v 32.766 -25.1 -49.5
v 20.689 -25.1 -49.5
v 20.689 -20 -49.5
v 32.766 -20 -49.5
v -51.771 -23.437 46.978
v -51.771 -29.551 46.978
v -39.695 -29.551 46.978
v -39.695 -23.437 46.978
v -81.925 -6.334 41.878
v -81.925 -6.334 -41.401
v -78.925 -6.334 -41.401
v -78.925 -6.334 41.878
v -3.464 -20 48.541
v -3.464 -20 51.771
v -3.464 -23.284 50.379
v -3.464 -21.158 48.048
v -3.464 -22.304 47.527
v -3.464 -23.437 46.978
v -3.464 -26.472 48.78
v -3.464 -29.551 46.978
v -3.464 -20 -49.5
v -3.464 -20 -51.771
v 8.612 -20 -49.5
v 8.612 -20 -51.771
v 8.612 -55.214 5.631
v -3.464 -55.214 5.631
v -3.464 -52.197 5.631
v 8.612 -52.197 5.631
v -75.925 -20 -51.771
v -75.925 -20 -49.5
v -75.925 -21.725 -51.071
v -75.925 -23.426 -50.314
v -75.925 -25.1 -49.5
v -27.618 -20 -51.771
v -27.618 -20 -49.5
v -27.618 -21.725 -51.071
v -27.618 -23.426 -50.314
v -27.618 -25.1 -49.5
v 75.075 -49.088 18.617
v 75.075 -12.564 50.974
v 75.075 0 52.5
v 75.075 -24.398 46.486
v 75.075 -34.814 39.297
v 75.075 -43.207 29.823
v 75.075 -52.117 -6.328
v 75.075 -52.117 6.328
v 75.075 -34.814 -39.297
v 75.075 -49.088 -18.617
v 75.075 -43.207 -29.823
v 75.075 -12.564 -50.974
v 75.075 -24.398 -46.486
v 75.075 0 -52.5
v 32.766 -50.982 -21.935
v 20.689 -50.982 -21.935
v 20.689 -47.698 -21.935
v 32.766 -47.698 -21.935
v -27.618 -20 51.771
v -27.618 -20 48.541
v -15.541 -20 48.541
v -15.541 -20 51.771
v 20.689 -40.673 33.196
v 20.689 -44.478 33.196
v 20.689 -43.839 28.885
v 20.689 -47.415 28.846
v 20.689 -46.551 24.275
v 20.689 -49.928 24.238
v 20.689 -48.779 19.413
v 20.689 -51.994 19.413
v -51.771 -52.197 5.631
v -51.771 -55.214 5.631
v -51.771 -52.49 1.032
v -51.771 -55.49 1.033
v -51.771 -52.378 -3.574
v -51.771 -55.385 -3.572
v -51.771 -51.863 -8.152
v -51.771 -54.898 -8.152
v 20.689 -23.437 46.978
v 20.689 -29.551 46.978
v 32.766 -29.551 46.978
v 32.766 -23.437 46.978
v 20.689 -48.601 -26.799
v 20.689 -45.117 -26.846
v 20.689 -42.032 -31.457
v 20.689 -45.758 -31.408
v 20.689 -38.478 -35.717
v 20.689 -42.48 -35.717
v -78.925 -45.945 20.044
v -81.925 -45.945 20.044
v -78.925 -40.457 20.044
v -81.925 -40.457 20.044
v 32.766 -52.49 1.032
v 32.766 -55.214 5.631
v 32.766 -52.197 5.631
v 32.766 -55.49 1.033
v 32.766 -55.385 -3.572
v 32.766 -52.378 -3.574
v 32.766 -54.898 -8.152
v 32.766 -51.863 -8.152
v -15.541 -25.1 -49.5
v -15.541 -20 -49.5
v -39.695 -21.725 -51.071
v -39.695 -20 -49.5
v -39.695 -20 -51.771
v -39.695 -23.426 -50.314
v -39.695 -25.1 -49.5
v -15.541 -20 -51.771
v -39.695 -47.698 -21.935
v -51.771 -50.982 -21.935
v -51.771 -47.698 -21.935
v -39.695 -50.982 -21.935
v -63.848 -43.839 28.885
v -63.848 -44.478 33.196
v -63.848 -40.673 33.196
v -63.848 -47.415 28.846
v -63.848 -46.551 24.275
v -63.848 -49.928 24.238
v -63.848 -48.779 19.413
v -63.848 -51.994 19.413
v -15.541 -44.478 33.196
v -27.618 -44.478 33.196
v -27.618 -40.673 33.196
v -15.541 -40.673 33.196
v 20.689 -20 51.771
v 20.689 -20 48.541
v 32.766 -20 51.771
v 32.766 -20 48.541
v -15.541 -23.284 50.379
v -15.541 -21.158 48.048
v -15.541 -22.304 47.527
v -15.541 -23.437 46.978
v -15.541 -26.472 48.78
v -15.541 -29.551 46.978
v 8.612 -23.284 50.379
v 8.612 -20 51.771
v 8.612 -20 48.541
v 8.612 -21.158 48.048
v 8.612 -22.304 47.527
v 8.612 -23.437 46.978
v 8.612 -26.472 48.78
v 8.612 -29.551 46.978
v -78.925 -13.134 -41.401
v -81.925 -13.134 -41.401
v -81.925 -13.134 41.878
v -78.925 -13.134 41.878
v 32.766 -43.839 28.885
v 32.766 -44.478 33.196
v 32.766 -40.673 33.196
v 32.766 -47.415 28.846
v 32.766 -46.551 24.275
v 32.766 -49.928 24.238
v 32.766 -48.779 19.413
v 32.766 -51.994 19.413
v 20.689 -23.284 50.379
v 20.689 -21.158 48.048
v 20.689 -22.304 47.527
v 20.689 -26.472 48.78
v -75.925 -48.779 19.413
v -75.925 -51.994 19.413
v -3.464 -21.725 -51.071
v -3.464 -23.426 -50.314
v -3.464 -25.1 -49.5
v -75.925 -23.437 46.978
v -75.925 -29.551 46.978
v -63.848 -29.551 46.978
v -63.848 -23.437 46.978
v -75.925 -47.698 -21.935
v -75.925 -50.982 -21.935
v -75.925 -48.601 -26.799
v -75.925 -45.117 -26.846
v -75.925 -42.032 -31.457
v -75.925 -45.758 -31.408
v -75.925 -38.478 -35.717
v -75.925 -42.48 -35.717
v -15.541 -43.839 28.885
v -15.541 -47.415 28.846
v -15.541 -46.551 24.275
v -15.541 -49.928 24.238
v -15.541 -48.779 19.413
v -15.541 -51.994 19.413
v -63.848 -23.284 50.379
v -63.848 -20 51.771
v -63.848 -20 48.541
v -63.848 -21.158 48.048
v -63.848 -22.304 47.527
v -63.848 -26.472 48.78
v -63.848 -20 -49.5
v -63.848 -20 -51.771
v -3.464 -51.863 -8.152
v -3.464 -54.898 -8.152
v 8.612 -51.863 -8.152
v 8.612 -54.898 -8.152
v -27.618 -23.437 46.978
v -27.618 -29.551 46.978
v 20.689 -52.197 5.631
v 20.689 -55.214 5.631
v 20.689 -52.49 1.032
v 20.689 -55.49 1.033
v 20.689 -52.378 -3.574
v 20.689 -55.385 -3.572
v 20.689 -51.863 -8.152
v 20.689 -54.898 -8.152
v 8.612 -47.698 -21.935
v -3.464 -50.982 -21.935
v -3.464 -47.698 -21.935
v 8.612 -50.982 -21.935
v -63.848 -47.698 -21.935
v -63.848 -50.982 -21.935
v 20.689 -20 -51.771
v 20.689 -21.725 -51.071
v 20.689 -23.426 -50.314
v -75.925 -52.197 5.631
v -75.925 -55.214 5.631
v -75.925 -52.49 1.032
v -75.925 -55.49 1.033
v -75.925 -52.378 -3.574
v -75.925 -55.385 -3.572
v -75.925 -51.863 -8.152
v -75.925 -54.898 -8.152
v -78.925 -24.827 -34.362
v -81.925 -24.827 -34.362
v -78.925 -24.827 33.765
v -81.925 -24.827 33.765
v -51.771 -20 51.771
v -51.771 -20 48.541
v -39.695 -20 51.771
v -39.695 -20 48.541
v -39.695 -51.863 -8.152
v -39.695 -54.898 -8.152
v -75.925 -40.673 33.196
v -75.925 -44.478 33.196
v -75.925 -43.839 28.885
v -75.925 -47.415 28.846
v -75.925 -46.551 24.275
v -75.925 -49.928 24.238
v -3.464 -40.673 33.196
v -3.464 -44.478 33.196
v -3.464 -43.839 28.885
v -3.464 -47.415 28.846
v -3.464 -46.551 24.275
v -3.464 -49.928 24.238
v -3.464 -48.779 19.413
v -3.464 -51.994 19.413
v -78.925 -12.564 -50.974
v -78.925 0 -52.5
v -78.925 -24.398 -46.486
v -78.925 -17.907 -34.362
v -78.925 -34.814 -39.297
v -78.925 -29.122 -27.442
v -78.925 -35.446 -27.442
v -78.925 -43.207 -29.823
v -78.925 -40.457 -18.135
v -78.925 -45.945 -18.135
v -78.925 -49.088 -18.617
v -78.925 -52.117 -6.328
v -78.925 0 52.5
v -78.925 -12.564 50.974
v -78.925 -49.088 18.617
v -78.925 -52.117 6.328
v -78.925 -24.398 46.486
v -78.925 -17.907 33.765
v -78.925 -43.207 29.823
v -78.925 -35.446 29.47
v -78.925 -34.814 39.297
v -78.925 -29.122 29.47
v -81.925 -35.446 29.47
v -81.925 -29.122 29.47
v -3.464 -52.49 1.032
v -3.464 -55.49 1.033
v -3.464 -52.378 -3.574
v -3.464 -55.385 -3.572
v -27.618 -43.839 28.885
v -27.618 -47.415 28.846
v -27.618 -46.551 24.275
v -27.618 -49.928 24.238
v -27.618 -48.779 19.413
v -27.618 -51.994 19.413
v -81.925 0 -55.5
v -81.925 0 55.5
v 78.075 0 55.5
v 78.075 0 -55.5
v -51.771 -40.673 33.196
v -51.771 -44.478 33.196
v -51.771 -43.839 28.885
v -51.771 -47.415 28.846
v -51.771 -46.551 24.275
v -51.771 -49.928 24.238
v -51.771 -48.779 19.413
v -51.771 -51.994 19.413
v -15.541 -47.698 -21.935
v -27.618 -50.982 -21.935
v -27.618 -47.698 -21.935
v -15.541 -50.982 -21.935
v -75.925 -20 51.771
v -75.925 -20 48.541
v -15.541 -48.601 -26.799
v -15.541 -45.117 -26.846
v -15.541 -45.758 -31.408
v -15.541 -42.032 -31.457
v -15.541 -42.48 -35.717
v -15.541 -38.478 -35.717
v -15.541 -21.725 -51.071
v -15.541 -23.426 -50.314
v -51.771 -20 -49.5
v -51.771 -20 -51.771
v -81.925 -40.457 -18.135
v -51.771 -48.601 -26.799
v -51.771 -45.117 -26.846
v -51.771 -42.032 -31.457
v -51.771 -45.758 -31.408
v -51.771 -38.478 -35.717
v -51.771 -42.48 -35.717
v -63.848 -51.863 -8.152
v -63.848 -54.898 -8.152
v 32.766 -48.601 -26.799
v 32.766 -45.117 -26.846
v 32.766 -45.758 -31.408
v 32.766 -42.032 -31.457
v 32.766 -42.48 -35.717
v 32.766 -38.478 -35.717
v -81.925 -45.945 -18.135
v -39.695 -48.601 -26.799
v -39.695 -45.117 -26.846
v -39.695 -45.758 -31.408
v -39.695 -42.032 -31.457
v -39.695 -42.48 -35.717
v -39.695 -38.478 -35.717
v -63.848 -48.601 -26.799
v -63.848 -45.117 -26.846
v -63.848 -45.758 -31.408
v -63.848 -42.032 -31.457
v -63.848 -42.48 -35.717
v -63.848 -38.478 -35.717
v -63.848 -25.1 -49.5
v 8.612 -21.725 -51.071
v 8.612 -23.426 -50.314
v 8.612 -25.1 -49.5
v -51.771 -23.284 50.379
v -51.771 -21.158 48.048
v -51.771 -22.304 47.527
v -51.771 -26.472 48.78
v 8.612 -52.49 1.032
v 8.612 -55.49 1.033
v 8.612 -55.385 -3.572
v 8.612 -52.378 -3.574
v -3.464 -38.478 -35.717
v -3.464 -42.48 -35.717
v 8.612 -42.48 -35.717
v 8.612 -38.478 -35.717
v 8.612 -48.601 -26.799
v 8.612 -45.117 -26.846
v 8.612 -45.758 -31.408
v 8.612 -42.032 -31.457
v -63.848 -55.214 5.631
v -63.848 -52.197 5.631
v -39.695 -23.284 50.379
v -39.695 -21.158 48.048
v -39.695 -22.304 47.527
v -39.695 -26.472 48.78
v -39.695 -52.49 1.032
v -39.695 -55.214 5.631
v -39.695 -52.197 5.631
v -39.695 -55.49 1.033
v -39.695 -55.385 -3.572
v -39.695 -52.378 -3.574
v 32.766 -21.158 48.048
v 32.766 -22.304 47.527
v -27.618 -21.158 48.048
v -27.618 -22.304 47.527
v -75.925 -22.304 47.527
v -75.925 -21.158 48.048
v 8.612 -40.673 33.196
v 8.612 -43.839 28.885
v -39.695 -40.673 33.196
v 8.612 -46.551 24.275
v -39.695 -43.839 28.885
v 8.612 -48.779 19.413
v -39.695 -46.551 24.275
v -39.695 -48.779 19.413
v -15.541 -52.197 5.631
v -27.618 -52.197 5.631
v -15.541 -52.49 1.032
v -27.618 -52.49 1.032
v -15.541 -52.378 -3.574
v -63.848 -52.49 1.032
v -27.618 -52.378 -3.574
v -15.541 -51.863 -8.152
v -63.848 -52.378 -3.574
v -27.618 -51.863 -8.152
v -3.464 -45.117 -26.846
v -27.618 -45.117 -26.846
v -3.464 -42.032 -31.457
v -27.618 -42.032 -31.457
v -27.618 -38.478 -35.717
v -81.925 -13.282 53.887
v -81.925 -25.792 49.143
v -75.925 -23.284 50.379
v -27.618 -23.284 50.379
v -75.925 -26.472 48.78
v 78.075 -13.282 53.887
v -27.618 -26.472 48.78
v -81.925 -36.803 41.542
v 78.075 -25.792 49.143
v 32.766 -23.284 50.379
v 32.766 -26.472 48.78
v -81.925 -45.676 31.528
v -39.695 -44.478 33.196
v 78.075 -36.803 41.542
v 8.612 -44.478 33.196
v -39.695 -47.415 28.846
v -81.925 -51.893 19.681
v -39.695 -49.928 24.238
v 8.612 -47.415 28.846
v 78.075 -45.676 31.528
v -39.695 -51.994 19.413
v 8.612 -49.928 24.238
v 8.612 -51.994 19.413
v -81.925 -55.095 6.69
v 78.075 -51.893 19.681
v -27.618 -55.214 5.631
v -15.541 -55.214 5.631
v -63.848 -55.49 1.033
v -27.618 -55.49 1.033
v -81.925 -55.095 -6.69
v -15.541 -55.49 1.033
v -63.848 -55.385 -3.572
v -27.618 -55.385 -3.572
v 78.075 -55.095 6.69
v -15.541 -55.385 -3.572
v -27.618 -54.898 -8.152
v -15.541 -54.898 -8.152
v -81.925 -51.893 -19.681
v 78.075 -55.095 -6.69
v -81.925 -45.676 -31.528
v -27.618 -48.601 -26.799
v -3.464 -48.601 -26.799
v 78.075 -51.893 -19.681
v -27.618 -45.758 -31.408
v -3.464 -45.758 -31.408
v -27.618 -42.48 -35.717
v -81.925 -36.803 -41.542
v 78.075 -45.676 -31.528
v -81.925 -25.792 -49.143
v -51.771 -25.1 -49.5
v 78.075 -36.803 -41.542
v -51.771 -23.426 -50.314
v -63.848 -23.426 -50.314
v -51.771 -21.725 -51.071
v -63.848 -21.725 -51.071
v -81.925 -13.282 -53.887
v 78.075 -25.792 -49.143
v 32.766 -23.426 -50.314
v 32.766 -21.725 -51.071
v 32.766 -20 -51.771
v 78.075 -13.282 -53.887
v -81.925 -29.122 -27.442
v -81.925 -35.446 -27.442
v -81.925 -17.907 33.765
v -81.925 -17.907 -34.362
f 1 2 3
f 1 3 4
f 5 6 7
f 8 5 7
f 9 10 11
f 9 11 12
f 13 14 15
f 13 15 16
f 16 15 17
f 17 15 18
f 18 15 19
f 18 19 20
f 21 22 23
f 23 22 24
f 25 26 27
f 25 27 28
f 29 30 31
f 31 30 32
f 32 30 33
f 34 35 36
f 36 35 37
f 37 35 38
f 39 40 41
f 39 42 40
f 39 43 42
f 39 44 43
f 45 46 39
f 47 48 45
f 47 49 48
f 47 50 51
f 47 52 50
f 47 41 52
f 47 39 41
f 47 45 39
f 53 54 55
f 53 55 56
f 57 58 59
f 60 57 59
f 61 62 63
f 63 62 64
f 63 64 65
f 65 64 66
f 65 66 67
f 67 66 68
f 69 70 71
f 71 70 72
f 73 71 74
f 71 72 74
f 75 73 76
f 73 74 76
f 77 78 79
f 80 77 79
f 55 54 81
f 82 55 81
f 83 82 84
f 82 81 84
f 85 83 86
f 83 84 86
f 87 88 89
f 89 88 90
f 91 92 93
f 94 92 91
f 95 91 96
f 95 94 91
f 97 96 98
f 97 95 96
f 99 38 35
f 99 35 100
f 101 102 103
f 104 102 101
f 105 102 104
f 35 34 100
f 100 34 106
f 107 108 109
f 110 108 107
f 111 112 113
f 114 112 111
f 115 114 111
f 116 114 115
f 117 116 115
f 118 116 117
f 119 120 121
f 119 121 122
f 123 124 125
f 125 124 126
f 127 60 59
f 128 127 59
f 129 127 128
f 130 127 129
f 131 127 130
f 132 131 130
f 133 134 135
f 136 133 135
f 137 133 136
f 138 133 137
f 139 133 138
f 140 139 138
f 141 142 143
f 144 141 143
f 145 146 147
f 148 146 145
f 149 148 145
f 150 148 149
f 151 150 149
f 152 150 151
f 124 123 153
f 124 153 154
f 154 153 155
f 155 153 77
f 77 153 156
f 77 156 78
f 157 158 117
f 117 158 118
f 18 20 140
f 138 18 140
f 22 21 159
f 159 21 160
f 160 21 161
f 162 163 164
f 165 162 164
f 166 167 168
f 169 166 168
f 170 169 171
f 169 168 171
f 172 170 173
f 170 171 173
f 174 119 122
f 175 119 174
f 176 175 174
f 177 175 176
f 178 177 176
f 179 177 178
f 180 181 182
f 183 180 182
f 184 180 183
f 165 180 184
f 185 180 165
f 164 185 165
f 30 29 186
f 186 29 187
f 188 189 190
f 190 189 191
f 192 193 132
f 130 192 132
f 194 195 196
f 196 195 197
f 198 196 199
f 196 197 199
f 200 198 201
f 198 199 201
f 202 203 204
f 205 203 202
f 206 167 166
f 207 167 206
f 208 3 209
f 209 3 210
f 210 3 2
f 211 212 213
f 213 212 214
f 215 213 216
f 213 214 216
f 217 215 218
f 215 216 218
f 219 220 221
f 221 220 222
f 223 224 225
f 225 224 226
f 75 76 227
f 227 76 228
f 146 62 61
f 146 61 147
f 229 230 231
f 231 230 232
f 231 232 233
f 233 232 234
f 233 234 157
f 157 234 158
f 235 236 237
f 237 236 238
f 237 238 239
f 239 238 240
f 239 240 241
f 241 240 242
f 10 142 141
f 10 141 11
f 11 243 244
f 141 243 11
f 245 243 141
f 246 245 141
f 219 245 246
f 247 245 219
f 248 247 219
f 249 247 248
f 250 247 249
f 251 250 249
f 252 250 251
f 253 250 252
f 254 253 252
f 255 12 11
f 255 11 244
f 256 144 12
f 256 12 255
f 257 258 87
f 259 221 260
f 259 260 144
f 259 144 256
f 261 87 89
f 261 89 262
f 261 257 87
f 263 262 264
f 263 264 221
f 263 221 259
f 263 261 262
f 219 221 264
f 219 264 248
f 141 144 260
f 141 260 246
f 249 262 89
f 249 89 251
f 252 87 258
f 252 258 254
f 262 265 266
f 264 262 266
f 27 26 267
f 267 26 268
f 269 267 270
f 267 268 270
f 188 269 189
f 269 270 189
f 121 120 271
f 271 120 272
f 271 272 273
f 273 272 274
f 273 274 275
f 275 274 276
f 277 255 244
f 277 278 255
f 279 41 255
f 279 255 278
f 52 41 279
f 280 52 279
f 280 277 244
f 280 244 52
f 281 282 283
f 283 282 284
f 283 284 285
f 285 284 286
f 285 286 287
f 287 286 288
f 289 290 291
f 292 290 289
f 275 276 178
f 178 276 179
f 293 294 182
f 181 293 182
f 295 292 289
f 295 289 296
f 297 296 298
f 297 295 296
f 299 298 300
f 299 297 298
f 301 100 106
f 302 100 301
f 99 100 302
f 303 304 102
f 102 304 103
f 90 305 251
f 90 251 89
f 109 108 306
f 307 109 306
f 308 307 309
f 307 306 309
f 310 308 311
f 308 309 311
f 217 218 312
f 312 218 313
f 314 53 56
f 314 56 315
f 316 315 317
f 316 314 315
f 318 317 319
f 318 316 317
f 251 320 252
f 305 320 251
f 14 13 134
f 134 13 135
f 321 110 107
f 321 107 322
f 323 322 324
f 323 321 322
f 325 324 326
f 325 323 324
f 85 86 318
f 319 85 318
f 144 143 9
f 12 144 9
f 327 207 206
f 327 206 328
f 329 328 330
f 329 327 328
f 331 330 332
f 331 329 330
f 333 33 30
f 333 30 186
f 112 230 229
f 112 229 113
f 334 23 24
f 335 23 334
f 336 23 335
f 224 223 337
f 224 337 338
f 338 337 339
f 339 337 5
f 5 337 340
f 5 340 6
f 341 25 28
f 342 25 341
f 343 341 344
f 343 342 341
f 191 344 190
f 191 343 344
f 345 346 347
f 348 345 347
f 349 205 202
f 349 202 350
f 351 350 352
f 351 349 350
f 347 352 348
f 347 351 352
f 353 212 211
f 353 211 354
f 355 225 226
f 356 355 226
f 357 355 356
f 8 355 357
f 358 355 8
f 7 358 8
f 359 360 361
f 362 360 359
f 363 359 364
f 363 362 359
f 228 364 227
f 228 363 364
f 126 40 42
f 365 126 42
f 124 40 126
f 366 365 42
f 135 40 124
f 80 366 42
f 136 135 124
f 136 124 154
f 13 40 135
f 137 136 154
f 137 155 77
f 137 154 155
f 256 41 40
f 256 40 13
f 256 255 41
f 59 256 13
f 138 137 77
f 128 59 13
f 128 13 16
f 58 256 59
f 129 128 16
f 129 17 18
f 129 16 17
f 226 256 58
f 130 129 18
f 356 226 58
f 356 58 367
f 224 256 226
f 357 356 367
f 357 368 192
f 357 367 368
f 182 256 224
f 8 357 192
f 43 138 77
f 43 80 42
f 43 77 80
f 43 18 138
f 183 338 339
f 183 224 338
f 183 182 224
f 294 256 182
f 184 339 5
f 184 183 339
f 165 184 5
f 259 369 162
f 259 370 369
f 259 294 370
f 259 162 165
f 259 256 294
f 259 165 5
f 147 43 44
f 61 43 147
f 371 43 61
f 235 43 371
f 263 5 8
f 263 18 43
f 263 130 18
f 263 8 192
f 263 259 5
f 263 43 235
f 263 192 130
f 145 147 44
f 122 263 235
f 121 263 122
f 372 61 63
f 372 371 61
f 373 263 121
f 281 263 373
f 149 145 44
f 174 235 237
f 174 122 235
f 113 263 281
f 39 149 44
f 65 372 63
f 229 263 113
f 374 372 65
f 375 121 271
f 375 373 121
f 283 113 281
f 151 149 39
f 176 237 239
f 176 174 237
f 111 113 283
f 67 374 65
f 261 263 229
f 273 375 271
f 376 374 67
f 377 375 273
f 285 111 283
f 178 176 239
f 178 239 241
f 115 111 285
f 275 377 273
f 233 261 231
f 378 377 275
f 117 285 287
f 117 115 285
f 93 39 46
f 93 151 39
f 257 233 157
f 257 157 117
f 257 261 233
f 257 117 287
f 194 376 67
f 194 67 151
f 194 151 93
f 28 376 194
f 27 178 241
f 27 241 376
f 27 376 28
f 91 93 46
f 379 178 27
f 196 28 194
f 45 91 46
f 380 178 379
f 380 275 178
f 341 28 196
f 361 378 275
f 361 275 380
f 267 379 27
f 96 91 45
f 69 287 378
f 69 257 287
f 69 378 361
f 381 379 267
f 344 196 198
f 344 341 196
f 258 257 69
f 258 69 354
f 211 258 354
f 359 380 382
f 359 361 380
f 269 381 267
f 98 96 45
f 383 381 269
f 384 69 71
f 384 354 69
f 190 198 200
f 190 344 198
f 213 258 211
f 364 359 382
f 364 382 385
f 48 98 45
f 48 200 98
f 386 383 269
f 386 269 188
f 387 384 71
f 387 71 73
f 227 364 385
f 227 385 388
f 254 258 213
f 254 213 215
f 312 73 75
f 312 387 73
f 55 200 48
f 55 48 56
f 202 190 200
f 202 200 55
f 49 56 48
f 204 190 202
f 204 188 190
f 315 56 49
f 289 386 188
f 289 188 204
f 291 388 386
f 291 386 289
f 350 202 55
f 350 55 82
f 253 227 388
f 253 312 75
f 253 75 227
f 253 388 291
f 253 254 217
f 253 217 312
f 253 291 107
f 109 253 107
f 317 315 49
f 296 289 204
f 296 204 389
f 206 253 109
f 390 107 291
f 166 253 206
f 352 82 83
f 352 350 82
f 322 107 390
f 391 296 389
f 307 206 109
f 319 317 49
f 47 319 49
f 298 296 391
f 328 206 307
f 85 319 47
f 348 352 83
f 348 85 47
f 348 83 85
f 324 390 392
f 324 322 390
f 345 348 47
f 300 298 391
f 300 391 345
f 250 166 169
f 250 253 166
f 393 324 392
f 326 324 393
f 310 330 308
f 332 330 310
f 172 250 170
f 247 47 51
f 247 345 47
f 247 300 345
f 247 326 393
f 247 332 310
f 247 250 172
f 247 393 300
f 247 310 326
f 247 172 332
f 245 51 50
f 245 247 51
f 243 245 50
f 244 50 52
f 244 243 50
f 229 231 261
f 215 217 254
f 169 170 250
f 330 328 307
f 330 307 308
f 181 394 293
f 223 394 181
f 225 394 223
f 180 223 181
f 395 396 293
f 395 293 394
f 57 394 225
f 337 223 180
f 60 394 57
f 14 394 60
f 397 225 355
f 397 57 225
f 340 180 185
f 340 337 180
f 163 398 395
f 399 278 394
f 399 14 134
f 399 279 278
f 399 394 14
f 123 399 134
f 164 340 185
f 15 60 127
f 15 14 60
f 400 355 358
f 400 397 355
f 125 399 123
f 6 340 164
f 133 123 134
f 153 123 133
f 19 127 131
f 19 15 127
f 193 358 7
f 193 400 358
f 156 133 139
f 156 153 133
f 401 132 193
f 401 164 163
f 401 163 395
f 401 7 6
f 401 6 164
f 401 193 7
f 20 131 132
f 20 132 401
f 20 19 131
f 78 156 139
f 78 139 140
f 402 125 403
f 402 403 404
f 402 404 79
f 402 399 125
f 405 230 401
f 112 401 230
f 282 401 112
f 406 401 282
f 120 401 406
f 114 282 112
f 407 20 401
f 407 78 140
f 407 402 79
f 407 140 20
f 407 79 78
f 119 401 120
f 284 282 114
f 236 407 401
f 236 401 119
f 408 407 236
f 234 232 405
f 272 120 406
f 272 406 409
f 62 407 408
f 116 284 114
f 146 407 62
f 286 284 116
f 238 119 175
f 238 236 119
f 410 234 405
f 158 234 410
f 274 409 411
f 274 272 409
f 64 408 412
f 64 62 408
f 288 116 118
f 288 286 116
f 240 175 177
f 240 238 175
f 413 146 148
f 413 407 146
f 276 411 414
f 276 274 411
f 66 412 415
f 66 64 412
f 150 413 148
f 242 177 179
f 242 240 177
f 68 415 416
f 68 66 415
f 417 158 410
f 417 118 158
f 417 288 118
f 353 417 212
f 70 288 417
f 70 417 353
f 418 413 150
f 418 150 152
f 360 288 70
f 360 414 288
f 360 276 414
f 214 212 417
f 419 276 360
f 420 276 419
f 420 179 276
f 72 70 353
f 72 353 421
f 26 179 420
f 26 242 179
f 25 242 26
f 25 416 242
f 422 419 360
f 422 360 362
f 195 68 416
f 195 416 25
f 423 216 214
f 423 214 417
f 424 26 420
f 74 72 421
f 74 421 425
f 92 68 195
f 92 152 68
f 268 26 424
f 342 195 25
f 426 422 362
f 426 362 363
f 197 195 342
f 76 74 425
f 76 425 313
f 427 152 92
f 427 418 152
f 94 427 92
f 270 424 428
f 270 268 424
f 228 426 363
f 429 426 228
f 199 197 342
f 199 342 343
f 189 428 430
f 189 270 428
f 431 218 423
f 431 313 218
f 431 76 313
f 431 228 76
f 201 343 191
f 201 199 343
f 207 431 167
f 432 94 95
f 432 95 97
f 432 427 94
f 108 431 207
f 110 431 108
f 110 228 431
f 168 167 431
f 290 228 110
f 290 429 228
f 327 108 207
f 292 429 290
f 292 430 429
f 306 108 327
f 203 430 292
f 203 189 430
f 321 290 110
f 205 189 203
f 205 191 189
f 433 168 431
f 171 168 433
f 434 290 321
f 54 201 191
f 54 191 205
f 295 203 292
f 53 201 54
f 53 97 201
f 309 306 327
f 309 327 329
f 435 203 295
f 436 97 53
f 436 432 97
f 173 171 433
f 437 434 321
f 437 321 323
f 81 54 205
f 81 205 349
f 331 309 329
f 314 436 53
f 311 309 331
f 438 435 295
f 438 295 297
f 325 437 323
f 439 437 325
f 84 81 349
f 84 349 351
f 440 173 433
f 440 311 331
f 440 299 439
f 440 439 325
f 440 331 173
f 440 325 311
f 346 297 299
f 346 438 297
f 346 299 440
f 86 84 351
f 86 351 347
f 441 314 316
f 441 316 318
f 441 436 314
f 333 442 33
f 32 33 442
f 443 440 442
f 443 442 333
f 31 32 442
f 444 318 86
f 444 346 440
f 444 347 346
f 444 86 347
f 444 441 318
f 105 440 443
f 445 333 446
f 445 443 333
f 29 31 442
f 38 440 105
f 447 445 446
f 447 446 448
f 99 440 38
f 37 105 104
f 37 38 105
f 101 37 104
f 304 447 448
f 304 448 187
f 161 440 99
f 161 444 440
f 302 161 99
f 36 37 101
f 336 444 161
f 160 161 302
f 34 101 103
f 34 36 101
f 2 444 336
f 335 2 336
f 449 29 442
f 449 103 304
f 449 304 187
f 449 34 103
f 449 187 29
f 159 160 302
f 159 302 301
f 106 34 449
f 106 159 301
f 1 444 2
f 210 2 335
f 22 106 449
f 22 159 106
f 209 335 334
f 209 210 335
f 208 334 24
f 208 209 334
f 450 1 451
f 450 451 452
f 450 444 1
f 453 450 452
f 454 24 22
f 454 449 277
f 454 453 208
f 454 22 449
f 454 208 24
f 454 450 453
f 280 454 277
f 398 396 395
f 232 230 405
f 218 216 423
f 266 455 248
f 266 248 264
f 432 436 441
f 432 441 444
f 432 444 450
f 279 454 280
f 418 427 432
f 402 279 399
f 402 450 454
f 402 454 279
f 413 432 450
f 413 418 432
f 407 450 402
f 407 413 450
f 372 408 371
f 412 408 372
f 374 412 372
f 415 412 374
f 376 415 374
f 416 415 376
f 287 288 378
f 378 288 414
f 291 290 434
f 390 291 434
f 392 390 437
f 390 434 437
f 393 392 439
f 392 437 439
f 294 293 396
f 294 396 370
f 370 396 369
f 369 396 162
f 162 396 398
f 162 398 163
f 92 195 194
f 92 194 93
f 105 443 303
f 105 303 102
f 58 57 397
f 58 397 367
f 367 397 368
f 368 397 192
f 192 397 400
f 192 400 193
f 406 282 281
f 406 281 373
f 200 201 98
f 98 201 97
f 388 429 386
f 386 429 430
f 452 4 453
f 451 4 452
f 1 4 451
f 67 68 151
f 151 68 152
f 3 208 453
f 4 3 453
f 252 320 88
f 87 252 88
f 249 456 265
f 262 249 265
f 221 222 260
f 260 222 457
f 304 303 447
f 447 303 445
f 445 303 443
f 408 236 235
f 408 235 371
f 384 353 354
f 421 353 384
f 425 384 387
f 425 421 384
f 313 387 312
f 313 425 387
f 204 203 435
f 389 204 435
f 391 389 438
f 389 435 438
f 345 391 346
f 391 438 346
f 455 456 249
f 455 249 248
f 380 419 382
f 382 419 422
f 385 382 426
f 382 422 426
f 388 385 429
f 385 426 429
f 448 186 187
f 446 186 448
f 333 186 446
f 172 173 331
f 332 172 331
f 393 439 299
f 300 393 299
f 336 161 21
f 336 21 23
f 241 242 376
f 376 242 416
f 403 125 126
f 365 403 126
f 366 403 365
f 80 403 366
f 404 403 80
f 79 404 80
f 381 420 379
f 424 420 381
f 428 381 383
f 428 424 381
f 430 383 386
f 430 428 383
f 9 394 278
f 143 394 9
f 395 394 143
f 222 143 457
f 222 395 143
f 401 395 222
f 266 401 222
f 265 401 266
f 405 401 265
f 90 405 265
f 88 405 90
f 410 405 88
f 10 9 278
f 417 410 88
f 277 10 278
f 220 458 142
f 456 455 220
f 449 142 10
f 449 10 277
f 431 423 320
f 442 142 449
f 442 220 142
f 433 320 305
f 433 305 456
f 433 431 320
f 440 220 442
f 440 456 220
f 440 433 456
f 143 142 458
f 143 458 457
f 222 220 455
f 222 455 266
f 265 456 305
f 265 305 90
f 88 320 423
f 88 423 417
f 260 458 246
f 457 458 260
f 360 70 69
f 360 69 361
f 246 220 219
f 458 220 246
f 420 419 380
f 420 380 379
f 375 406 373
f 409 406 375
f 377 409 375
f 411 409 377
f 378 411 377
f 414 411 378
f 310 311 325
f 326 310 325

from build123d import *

# Parameters (mm, degrees)
REVOLVE_1_ANGLE     = 180
CUT_EXTRUDE_START   = -100
SKETCH_6_W          = 12.076682438
SKETCH_6_H          = 14.39053984
SKETCH_6_H_2        = 13.782632099
SKETCH_6_H_3        = 13.782632098
SKETCH_6_H_4        = 22.837839873
CUT_EXTRUDE_3_DEPTH = 80
SKETCH_7_W          = 83.279125937
SKETCH_7_H          = 6.800730915
SKETCH_7_W_2        = 68.126620215
SKETCH_7_H_2        = 6.920041983
SKETCH_7_W_3        = 56.91137976
SKETCH_7_H_3        = 6.32348664
SKETCH_7_W_4        = 38.179541977
SKETCH_7_H_4        = 5.488309159
CUT_EXTRUDE_4_DEPTH = 80


with BuildPart() as part:
    # 草图1 → 旋转1 (revolve)
    with BuildSketch(Plane(origin=(0, 0, 0), x_dir=(1, 0, 0), z_dir=(0, 1, 0))):
        Polygon((-78.924564797, 0), (-81.924564797, 0), (-81.924564797, -55.5), (78.075435203, -55.5), (78.075435203, 0), (75.075435203, 0), (75.075435203, -52.5), (-78.924564797, -52.5), align=None)
    revolve(axis=Axis((-95.756286267, 0, 0), (1, 0, 0)), revolution_arc=REVOLVE_1_ANGLE)

    # 草图6 → 切除-拉伸3 (cut)
    with BuildSketch(Plane(origin=(0, 0, 0), x_dir=(1, 0, 0), z_dir=(0, 1, 0)).offset(CUT_EXTRUDE_START)):
        with Locations((-69.886223578, 56.69526992)):
            Rectangle(SKETCH_6_W, SKETCH_6_H)
        with Locations((-69.886223578, 28.826051853)):
            Rectangle(SKETCH_6_W, SKETCH_6_H_2)
        with Locations((-69.886223578, 1.260787656)):
            Rectangle(SKETCH_6_W, SKETCH_6_H_3)
        with Locations((-69.886223578, -26.304476541)):
            Rectangle(SKETCH_6_W, SKETCH_6_H_2)
        with Locations((-69.886223578, -58.397344625)):
            Rectangle(SKETCH_6_W, SKETCH_6_H_4)
        with Locations((-45.732858702, 56.69526992)):
            Rectangle(SKETCH_6_W, SKETCH_6_H)
        with Locations((-21.579493826, 56.69526992)):
            Rectangle(SKETCH_6_W, SKETCH_6_H)
        with Locations((2.57387105, 56.69526992)):
            Rectangle(SKETCH_6_W, SKETCH_6_H)
        with Locations((26.727235926, 56.69526992)):
            Rectangle(SKETCH_6_W, SKETCH_6_H)
        with Locations((-45.732858702, -58.397344625)):
            Rectangle(SKETCH_6_W, SKETCH_6_H_4)
        with Locations((-21.579493826, -58.397344625)):
            Rectangle(SKETCH_6_W, SKETCH_6_H_4)
        with Locations((2.57387105, -58.397344625)):
            Rectangle(SKETCH_6_W, SKETCH_6_H_4)
        with Locations((26.727235926, -58.397344625)):
            Rectangle(SKETCH_6_W, SKETCH_6_H_4)
        with Locations((-45.732858702, 28.826051853)):
            Rectangle(SKETCH_6_W, SKETCH_6_H_2)
        with Locations((-21.579493826, 28.826051853)):
            Rectangle(SKETCH_6_W, SKETCH_6_H_2)
        with Locations((2.57387105, 28.826051853)):
            Rectangle(SKETCH_6_W, SKETCH_6_H_2)
        with Locations((26.727235926, 28.826051853)):
            Rectangle(SKETCH_6_W, SKETCH_6_H_2)
        with Locations((-45.732858702, 1.260787656)):
            Rectangle(SKETCH_6_W, SKETCH_6_H_3)
        with Locations((-21.579493826, 1.260787656)):
            Rectangle(SKETCH_6_W, SKETCH_6_H_3)
        with Locations((2.57387105, 1.260787656)):
            Rectangle(SKETCH_6_W, SKETCH_6_H_3)
        with Locations((26.727235926, 1.260787656)):
            Rectangle(SKETCH_6_W, SKETCH_6_H_3)
        with Locations((26.727235926, -26.304476541)):
            Rectangle(SKETCH_6_W, SKETCH_6_H_2)
        with Locations((2.57387105, -26.304476541)):
            Rectangle(SKETCH_6_W, SKETCH_6_H_2)
        with Locations((-21.579493826, -26.304476541)):
            Rectangle(SKETCH_6_W, SKETCH_6_H_2)
        with Locations((-45.732858702, -26.304476541)):
            Rectangle(SKETCH_6_W, SKETCH_6_H_2)
    extrude(amount=CUT_EXTRUDE_3_DEPTH, mode=Mode.SUBTRACT)

    # 草图7 → 切除-拉伸4 (cut)
    with BuildSketch(Plane.ZY.offset(81.924564797)):
        with Locations((0.238622138, -9.73402863)):
            Rectangle(SKETCH_7_W, SKETCH_7_H)
        with Locations((-0.298277671, -21.366857825)):
            Rectangle(SKETCH_7_W_2, SKETCH_7_H_2)
        with Locations((1.014144084, -32.28382061)):
            Rectangle(SKETCH_7_W_3, SKETCH_7_H_3)
        with Locations((0.95448855, -43.200783394)):
            Rectangle(SKETCH_7_W_4, SKETCH_7_H_4)
    extrude(amount=-CUT_EXTRUDE_4_DEPTH, mode=Mode.SUBTRACT)


solid = part.part
